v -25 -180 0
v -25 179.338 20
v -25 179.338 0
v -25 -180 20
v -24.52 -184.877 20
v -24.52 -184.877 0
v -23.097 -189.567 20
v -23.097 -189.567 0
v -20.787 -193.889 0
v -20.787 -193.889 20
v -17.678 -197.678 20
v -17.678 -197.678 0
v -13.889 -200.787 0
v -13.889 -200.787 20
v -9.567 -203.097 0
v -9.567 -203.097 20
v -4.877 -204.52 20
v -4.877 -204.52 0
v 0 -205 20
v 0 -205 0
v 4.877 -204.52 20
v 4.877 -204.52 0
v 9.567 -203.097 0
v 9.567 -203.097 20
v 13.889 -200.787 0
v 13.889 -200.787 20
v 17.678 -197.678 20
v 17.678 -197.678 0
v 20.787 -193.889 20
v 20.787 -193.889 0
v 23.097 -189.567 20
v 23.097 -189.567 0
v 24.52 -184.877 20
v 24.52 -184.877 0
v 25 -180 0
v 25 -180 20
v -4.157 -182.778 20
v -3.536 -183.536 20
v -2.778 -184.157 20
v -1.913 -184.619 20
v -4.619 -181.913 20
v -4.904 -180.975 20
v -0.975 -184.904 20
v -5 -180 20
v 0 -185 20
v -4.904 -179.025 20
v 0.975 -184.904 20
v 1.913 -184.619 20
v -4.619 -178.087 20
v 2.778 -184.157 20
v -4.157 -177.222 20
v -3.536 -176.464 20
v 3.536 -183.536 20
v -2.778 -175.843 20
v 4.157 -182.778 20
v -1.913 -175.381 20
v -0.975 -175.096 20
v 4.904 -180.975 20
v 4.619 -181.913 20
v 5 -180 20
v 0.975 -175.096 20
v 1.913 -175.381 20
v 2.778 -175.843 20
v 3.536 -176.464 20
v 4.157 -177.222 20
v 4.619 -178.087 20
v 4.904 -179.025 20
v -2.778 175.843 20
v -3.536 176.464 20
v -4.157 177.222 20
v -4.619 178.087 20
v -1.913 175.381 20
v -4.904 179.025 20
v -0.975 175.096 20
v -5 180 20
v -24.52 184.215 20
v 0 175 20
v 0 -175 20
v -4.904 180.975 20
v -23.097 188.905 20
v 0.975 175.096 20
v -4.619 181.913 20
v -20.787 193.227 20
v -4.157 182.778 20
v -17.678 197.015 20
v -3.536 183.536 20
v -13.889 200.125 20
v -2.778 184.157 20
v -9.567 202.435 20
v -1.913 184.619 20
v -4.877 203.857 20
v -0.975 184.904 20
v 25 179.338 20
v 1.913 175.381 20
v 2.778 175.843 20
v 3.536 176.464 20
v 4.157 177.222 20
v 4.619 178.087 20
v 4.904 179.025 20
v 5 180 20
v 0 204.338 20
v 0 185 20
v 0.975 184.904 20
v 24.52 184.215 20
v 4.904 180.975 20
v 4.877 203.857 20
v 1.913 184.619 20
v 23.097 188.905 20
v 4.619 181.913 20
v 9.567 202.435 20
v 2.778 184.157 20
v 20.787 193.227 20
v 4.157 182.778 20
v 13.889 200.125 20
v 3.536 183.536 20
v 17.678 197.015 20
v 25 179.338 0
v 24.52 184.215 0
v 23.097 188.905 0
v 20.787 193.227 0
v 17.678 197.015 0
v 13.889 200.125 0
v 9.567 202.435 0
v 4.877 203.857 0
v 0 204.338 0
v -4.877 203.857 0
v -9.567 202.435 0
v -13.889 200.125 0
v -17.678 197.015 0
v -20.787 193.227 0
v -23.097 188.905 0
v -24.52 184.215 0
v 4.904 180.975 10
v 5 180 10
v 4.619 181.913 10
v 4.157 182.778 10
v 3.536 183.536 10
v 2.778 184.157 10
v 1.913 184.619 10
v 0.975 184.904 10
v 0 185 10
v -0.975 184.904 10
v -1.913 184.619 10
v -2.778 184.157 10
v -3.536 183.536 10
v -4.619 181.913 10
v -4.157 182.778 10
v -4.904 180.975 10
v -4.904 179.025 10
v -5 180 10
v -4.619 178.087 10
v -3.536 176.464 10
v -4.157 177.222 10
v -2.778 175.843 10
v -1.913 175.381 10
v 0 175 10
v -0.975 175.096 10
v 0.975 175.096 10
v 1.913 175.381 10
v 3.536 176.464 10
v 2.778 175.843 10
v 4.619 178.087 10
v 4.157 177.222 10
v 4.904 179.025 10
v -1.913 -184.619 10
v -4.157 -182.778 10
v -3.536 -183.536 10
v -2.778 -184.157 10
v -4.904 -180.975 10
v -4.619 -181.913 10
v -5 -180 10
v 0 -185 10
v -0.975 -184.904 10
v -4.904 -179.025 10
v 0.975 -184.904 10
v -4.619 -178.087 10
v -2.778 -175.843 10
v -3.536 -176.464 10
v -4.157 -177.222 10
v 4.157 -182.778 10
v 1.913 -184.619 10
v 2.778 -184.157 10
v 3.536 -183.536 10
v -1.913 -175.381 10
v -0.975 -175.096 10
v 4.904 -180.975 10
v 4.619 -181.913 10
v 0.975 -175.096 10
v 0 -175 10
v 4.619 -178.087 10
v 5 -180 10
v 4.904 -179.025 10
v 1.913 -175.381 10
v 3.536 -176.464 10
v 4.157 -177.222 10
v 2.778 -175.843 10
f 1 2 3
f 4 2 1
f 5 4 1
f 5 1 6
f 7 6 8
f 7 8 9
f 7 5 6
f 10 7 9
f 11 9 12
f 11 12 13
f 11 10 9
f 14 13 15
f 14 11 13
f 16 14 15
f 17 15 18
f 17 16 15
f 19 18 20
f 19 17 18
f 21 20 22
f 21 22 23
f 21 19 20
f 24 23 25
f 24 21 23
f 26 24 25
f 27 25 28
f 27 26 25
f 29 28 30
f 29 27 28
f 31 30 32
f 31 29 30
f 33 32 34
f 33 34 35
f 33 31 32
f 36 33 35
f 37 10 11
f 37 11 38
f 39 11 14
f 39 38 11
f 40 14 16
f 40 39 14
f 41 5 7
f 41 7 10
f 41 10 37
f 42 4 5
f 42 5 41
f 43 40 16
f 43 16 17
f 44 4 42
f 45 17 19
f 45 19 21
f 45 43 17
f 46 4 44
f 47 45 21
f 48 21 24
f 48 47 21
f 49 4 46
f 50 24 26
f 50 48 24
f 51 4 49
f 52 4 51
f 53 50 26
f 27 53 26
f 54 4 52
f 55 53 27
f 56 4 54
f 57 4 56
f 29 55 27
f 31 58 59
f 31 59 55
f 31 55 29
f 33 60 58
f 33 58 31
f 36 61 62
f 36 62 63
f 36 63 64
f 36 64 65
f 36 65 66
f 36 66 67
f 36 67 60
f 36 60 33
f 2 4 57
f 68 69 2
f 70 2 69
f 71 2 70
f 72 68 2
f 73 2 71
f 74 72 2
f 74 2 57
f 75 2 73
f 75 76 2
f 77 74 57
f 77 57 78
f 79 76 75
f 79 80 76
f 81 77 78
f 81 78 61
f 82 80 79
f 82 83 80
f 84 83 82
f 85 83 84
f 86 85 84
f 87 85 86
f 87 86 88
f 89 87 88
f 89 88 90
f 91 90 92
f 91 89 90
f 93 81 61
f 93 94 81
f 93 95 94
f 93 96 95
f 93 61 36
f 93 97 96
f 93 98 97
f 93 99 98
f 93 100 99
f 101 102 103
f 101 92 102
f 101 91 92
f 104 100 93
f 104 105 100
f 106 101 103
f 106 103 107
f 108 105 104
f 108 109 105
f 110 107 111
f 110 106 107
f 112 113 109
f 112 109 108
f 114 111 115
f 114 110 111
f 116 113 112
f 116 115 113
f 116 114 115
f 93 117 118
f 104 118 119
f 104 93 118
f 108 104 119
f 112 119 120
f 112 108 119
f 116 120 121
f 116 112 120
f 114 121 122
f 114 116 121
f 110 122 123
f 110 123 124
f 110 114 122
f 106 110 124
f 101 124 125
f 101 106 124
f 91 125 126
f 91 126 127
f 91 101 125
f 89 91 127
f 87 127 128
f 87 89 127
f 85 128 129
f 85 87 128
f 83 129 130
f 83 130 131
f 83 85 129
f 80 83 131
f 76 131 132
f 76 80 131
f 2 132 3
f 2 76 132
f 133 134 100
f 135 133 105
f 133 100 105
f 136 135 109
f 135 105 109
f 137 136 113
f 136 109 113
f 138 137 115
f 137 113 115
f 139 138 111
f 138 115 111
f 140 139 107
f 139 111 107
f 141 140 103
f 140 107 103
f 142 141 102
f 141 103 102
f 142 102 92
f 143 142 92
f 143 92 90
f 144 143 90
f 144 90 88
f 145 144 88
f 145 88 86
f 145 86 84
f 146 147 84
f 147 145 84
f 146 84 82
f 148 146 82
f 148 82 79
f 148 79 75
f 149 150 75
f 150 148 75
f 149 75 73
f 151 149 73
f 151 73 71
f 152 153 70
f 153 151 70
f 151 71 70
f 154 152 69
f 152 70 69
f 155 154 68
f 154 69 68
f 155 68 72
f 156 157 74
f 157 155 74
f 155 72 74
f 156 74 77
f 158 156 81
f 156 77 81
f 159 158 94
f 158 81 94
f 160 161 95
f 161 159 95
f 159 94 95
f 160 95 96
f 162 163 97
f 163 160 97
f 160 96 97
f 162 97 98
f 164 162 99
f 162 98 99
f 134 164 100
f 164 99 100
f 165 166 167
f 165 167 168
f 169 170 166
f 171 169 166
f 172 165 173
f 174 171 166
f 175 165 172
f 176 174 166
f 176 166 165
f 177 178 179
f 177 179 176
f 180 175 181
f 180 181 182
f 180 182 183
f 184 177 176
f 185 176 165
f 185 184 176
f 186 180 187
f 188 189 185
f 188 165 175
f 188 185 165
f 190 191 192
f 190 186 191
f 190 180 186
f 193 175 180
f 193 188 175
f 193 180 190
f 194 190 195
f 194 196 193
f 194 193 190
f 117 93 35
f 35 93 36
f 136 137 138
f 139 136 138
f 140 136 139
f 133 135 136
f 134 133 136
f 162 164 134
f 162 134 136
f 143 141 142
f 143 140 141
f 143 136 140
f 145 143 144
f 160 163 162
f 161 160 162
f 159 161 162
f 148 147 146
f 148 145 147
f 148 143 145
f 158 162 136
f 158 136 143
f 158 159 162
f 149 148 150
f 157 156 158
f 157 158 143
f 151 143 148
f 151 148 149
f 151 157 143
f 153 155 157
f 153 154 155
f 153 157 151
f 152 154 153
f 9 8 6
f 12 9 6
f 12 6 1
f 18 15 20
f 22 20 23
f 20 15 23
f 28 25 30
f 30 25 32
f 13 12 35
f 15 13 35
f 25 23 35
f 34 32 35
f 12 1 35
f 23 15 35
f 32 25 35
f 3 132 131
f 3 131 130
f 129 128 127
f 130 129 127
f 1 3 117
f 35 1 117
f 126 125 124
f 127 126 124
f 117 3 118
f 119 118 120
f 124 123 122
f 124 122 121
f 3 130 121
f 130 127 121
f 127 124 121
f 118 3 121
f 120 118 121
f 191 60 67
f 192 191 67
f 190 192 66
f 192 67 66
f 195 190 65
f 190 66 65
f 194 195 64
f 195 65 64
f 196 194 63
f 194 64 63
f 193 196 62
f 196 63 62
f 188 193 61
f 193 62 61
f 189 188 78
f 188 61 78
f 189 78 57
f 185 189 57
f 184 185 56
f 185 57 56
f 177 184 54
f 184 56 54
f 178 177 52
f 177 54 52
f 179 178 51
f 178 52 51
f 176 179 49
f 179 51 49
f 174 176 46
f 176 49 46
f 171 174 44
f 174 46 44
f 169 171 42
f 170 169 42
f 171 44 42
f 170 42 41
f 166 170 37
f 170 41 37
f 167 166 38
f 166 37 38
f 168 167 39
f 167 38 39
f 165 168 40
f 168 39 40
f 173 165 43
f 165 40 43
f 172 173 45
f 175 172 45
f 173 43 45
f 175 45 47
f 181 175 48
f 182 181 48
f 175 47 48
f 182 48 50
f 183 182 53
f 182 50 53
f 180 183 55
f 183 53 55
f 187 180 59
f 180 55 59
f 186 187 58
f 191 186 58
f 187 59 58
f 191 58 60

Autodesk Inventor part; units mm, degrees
ref_plane "YZ Plane" through (0, 0, 0) normal (1, 0, 0) x (0, 1, 0)
ref_plane "XZ Plane" through (0, 0, 0) normal (0, 1, 0) x (-1, 0, 0)
ref_plane "XY Plane" through (0, 0, 0) normal (0, 0, 1) x (1, 0, 0)
sketch "Sketch1" plane through (0, 0, 0) normal (0, 0, 1) x (1, 0, 0)
  line L0 (-7.5, 200) -> (7.5, 200)
  line L1 (7.5, 200) -> (7.5, -200)
  line L2 (7.5, -200) -> (-7.5, -200)
  line L3 (-7.5, -200) -> (-7.5, 200)
  line L4 (-35, 0) -> (35, 0) projected
  line L5 (0, -315) -> (0, 315) projected
  line L6 (-25, 200) -> (-25, -200)
  line L7 (25, 200) -> (25, -200)
  arc A0 (25, 200) -> (-25, 200) centre (0, 200) ccw
  arc A1 (-25, -200) -> (25, -200) centre (0, -200) ccw
  point P0 (0, 0)
  dimension "d4" = 7.5
  dimension "d5" = 7.5
  dimension "d6" = 200
  dimension "d7" = 200
extrude "Extrusion1" add sketch "Sketch1" along normal blind 20 contours L0 L5 L4 L3 | L0 L1 L4 L5 | L4 L5 L2 L3 | L4 L1 L2 L5
sketch "Sketch2" plane through (0, 0, 20) normal (0, 0, 1) x (1, 0, 0)
  circle A0 centre (0, 180) radius 5
  circle A1 centre (0, -180) radius 5
  line L0 (-10.5, 0) -> (10.5, 0) projected
  line L1 (0, -280) -> (0, 280) projected
  point P0 (0, 0)
  dimension "d8" = 10
  dimension "d9" = 180
  dimension "d10" = 180
  dimension "d11" = 10
extrude "Extrusion2" cut sketch "Sketch2" against normal blind 10
sketch "Sketch3" plane through (0, 0, 20) normal (0, 0, 1) x (1, 0, 0)
  circle A0 centre (0, -180) radius 5 projected
  circle A1 centre (0, -180) radius 25
  circle A2 centre (0, 179.3378) radius 25
  line L0 (-25, 179.3378) -> (-25, -180)
  line L1 (25, 179.3378) -> (25, -180)
  point P0 (0, 0)
  dimension "d14" = 50
  dimension "d15" = 50
extrude "Extrusion3" add sketch "Sketch3" against normal blind 20
mirror "Mirror1" about plane through (0, 0, 0) normal (0, 1, 0) of "Extrusion2"
